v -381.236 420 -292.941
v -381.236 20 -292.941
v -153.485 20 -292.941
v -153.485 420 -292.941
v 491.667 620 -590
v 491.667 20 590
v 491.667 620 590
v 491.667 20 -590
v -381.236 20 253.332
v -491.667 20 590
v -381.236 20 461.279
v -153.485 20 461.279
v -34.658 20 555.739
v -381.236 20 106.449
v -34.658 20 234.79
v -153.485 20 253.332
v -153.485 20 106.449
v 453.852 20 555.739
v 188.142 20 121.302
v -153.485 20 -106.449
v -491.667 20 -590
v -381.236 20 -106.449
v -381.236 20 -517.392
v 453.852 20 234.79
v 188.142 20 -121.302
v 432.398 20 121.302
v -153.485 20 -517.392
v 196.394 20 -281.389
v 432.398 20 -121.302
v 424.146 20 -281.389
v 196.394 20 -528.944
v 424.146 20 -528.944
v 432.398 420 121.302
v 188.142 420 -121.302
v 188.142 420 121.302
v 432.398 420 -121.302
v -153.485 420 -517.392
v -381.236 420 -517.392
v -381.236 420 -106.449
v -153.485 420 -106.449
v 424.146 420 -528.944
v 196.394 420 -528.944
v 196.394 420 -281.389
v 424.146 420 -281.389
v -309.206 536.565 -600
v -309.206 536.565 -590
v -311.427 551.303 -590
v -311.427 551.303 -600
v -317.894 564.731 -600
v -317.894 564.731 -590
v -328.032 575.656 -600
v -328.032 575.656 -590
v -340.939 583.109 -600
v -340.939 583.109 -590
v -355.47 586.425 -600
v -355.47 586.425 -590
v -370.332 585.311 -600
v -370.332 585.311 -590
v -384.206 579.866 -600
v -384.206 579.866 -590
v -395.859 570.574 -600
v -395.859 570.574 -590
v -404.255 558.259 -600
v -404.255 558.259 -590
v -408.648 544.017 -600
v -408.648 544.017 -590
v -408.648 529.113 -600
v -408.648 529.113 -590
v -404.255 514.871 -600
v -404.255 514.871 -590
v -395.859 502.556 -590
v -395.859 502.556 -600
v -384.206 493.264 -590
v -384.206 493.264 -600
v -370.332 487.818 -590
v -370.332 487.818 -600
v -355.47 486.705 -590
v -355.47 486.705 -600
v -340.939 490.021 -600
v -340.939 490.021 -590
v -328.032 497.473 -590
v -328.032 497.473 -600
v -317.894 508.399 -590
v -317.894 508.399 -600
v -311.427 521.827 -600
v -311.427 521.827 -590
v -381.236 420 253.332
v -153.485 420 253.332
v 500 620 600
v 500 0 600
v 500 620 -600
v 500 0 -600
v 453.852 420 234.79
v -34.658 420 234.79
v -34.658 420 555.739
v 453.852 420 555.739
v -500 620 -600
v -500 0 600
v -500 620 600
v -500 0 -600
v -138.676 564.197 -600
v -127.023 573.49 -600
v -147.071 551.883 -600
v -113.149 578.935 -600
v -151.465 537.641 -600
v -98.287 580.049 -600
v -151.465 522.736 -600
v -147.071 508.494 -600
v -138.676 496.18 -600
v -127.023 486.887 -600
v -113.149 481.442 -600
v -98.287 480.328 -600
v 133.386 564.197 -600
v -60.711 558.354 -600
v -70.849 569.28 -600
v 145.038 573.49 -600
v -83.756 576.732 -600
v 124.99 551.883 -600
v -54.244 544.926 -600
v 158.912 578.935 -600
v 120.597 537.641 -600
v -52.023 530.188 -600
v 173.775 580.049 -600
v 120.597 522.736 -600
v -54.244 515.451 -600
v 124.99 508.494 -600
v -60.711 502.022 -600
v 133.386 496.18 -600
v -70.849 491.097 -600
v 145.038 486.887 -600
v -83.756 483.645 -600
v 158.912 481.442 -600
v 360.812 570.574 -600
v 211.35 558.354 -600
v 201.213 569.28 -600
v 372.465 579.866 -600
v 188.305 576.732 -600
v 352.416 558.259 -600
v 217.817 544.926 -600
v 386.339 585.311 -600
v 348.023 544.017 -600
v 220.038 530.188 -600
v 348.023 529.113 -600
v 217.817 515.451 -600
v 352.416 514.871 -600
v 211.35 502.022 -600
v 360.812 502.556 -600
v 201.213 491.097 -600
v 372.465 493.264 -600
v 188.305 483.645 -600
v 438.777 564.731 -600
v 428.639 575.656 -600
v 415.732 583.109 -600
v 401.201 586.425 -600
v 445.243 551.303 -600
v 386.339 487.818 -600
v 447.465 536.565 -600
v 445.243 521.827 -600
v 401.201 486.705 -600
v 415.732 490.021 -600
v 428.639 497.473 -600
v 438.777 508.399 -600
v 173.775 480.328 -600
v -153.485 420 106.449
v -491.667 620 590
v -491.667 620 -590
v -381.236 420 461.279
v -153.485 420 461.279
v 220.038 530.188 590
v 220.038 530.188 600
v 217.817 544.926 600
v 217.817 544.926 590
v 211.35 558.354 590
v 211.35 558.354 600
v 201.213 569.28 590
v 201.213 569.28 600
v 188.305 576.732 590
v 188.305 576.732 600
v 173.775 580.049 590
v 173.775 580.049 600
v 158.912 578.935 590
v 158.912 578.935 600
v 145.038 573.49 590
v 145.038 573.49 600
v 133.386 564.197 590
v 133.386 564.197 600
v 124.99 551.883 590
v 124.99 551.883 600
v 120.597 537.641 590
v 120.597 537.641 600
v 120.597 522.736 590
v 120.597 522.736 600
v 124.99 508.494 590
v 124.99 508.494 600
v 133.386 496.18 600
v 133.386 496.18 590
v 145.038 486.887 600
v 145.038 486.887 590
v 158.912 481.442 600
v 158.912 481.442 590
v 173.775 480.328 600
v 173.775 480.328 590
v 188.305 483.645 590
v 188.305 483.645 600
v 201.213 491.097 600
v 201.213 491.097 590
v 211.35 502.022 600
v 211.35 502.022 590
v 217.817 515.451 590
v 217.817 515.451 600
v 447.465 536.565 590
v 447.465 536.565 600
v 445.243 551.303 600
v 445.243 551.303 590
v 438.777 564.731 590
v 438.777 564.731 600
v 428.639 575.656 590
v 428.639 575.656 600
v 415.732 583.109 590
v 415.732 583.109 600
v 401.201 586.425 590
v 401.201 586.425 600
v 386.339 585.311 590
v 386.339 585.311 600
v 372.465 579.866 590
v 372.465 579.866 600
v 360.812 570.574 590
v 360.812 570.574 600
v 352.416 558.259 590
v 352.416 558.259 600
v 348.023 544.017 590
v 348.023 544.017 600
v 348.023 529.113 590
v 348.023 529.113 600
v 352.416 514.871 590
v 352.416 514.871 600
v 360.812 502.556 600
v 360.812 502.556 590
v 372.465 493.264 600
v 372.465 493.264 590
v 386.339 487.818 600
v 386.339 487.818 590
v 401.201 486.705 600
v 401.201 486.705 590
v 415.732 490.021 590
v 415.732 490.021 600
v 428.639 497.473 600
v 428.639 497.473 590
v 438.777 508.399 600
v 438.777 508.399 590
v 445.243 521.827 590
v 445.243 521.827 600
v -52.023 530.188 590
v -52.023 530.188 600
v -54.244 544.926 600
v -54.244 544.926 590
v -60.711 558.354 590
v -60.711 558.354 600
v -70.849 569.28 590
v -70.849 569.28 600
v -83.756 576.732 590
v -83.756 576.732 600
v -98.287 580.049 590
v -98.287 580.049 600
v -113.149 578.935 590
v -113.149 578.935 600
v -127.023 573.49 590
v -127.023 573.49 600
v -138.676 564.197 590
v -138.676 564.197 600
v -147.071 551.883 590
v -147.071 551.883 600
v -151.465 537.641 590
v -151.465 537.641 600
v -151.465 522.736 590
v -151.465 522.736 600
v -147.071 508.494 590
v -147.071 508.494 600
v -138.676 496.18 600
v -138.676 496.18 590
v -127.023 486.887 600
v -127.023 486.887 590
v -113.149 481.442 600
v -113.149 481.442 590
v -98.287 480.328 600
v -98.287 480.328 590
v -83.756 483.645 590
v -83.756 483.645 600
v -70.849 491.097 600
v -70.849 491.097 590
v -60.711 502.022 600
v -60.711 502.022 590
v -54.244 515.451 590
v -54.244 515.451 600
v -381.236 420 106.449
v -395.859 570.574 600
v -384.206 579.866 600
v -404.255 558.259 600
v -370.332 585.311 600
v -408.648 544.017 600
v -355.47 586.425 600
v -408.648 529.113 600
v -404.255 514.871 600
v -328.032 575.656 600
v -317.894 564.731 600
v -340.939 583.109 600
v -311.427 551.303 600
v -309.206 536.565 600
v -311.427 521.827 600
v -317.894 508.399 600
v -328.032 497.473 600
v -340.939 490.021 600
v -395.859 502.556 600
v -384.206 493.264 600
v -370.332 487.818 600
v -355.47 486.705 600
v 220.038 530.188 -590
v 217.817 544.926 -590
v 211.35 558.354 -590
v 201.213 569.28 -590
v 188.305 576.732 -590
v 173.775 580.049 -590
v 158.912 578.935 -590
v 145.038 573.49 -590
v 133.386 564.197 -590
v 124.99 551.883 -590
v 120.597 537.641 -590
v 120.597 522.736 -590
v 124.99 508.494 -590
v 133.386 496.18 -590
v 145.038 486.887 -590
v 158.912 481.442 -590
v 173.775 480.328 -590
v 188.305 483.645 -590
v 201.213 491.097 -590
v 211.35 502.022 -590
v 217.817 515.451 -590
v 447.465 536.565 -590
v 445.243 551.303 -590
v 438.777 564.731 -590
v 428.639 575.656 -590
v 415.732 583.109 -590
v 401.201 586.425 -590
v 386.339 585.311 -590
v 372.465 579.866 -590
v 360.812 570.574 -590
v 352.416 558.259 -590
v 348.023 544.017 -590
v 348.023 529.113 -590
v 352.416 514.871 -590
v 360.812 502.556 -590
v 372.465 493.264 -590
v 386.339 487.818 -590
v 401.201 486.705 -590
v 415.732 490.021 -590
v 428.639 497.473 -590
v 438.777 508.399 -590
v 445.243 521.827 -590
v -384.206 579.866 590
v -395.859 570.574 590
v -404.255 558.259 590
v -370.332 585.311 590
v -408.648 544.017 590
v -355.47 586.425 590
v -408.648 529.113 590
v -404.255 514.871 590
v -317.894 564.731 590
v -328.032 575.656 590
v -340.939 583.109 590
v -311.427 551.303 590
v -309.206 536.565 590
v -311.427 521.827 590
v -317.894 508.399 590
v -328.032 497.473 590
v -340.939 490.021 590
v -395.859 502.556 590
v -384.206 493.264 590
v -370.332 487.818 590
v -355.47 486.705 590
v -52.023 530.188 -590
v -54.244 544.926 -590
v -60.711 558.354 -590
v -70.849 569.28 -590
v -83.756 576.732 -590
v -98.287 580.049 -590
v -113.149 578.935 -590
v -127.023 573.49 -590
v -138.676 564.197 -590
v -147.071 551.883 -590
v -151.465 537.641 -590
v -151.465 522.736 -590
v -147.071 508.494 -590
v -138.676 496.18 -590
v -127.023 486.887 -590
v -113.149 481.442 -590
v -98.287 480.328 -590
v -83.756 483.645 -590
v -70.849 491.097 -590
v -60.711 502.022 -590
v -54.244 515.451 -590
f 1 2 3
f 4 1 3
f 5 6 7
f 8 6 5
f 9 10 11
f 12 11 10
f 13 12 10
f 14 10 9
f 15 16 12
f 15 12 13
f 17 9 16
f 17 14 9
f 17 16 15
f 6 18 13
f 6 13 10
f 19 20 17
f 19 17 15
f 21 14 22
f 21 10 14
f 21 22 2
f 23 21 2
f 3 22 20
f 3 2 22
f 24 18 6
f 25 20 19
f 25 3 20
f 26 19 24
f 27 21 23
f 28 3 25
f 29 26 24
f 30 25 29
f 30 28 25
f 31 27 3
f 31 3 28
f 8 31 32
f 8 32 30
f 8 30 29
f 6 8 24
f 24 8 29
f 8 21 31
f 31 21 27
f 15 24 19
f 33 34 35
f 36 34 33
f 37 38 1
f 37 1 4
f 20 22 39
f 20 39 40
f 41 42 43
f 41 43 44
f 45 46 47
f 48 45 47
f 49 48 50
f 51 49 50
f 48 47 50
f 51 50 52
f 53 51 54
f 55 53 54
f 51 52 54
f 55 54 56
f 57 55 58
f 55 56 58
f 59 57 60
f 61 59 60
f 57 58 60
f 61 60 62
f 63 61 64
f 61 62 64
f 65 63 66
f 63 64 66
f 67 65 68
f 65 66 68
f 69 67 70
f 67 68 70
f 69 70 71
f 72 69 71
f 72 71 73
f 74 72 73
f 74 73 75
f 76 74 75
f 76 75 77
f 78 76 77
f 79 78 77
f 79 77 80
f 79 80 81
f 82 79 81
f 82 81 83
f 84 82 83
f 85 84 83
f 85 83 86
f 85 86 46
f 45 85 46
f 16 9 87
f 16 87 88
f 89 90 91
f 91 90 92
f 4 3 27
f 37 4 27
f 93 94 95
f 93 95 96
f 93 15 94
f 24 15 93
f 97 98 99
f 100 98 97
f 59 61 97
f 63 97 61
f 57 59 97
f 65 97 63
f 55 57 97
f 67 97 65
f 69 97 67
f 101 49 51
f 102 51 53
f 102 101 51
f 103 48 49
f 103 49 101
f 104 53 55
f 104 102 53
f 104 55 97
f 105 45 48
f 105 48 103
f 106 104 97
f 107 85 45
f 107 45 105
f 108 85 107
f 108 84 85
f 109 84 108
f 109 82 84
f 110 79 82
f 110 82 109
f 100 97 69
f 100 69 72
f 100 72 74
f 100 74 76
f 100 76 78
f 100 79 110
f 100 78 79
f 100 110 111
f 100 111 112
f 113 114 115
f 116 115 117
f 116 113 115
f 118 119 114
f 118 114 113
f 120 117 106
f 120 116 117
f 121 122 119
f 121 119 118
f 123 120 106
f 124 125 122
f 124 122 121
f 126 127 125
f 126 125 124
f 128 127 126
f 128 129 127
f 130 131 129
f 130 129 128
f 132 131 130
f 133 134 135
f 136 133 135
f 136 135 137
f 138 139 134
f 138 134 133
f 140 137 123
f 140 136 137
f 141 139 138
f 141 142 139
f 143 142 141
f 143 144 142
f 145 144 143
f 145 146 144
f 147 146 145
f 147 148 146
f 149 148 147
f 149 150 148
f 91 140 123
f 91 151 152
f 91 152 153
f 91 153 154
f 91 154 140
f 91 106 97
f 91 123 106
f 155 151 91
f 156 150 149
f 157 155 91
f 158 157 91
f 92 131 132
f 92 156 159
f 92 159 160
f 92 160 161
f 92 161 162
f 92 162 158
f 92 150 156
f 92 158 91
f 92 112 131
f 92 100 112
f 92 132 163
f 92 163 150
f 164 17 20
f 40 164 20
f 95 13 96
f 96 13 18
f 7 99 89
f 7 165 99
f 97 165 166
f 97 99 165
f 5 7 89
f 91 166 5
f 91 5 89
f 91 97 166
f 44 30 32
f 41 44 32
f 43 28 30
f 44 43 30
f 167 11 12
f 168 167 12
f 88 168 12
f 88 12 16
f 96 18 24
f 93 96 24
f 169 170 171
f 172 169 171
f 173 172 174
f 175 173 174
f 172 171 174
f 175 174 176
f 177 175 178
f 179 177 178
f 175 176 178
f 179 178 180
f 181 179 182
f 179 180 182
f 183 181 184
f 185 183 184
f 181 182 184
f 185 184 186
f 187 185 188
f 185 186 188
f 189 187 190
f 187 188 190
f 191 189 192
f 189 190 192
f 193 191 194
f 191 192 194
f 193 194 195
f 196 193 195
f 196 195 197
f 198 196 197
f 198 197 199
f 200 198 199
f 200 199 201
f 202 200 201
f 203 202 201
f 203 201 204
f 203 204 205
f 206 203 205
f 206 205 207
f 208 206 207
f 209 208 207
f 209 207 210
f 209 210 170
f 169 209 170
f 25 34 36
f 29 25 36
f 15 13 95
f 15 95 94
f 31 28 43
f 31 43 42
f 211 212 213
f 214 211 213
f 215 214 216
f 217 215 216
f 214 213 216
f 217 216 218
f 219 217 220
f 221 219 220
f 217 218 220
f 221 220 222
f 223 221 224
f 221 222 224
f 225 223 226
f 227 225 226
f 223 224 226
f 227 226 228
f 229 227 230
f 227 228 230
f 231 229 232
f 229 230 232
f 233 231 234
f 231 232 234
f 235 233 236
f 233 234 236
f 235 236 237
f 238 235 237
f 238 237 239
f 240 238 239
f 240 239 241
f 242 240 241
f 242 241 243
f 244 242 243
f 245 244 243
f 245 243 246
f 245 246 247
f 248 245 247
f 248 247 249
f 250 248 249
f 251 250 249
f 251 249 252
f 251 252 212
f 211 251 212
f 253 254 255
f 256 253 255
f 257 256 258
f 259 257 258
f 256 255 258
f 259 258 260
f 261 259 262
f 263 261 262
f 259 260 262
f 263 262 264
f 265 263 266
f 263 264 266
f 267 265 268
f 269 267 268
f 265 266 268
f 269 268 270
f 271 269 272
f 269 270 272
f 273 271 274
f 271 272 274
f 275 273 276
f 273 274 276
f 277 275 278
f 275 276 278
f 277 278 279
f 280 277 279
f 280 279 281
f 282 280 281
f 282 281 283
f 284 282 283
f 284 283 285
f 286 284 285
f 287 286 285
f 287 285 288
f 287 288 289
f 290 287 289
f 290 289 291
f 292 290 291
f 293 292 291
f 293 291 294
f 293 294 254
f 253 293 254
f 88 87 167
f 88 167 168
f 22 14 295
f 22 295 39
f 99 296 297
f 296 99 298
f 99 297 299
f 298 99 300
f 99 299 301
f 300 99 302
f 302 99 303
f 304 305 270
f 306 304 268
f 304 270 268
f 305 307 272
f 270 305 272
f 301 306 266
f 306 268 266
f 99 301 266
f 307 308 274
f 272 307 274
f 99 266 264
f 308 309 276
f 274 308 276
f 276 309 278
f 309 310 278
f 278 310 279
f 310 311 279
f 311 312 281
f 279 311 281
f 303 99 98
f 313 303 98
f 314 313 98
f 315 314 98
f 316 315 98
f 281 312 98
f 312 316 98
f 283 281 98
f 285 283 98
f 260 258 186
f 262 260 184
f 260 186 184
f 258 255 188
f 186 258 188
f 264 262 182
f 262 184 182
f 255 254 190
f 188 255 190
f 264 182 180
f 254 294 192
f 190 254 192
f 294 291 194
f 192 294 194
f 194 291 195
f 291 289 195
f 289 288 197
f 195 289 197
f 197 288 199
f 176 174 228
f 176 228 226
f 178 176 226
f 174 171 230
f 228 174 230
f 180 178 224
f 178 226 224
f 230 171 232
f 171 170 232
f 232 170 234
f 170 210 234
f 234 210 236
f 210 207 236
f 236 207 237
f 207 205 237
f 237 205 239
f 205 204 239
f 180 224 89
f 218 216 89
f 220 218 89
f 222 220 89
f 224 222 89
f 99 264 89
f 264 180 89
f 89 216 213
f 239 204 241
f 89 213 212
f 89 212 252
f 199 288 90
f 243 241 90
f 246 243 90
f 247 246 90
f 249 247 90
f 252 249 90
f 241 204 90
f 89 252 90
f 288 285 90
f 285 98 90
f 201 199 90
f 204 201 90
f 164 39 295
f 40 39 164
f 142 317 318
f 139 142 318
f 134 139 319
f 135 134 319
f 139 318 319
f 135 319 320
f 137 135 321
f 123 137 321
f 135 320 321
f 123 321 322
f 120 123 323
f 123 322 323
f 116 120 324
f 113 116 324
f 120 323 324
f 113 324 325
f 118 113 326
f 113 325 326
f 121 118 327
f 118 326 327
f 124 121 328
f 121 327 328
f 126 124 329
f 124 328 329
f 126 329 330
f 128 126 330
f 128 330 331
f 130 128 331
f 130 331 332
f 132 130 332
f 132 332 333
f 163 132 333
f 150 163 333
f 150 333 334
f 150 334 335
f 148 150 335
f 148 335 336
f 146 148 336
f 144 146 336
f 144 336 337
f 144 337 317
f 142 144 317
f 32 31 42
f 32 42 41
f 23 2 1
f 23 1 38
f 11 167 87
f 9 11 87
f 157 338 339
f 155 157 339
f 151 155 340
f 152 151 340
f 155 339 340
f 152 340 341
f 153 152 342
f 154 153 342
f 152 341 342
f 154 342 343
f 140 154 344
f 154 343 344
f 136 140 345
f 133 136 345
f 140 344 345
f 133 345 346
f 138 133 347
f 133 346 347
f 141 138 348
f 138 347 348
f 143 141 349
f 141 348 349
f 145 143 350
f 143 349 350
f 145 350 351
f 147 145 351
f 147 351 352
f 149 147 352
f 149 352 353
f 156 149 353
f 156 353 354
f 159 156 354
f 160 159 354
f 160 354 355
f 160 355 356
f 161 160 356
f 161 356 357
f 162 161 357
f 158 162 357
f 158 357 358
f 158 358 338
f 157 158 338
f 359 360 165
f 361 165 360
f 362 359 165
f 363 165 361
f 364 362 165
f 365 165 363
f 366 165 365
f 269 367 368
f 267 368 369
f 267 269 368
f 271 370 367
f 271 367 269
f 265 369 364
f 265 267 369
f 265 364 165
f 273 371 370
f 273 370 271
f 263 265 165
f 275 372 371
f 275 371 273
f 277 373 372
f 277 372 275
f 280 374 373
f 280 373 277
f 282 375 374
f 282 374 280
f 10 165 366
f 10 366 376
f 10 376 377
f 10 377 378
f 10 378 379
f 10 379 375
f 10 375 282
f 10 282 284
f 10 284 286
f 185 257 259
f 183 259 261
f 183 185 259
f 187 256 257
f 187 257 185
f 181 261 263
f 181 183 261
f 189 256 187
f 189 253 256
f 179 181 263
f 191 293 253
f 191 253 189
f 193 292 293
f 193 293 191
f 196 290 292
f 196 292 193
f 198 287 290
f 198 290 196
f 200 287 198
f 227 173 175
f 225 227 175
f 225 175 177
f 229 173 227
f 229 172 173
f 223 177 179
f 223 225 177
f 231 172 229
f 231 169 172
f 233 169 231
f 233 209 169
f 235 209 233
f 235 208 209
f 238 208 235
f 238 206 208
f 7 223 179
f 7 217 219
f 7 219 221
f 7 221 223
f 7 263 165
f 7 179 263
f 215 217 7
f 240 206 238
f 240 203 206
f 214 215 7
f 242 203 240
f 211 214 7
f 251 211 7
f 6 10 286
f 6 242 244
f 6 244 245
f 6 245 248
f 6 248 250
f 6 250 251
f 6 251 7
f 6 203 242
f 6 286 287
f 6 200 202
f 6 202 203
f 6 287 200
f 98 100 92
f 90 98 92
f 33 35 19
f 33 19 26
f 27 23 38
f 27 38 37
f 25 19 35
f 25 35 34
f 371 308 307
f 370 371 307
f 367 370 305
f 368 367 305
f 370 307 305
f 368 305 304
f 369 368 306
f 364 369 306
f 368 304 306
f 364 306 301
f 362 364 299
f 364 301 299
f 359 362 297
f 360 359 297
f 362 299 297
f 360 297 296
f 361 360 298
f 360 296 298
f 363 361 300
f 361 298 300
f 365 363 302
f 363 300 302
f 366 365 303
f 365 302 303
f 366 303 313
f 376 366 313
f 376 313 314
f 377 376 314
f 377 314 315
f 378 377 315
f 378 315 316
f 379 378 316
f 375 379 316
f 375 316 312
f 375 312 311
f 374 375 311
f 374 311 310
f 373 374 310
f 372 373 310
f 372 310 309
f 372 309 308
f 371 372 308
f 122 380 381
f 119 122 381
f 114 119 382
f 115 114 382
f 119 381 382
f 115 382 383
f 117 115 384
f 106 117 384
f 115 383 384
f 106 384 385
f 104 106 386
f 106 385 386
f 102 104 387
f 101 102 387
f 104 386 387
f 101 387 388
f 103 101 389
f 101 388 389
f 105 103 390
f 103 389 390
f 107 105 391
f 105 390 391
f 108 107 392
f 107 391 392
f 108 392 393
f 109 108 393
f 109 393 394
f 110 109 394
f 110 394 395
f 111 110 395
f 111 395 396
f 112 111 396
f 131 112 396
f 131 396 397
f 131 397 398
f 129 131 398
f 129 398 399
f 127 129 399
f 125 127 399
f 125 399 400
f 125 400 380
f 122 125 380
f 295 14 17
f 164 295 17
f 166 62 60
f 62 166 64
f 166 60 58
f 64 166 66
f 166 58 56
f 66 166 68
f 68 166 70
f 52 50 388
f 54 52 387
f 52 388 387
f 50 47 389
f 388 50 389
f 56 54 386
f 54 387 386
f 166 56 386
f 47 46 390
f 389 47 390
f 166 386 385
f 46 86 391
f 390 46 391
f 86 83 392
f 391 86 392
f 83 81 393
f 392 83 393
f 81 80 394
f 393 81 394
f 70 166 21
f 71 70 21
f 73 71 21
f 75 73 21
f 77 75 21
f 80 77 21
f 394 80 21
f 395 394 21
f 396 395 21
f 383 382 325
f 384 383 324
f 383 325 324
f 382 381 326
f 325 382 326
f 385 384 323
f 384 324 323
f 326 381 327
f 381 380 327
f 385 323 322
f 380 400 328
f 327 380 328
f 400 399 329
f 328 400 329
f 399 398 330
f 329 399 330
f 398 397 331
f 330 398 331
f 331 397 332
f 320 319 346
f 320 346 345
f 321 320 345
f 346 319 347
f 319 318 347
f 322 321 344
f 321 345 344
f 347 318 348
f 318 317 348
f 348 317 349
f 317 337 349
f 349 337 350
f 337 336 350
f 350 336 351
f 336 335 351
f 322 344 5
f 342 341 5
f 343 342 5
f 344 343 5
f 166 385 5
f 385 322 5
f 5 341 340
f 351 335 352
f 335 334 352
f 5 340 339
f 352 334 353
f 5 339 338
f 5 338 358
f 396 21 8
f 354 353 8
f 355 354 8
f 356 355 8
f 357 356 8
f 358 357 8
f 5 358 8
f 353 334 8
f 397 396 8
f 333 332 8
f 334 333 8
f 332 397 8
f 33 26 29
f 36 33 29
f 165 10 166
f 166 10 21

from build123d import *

# Parameters (mm, degrees)
SKETCH1_W           = 1000
SKETCH1_H           = 1200
BOSS_EXTRUDE1_DEPTH = 20
SKETCH2_W           = 1000
SKETCH2_H           = 1200
SKETCH2_W_2         = 983.333333334
SKETCH2_H_2         = 1180
BOSS_EXTRUDE2_DEPTH = 600
SKETCH3_W           = 227.751399754
SKETCH3_H           = 224.45065483
SKETCH3_H_2         = 247.555869298
SKETCH3_H_3         = 212.898047596
SKETCH3_W_2         = 244.255124374
SKETCH3_H_4         = 242.604751912
SKETCH3_H_5         = 207.946930211
SKETCH3_W_3         = 488.510248749
SKETCH3_H_6         = 320.94890349
BOSS_EXTRUDE3_DEPTH = 400
SKETCH13_R          = 50
CUT_EXTRUDE1_DEPTH  = 1441.277750991


with BuildPart() as part:
    # Sketch1 → Boss-Extrude1 (new body)
    with BuildSketch(Plane(origin=(0, 0, 0), x_dir=(1, 0, 0), z_dir=(0, 1, 0))):
        Rectangle(SKETCH1_W, SKETCH1_H)
    extrude(amount=BOSS_EXTRUDE1_DEPTH)

    # Sketch2 → Boss-Extrude2 (add)
    with BuildSketch(Plane(origin=(0, 20, 0), x_dir=(1, 0, 0), z_dir=(0, 1, 0))):
        Rectangle(SKETCH2_W, SKETCH2_H)
        Rectangle(SKETCH2_W_2, SKETCH2_H_2, mode=Mode.SUBTRACT)
    extrude(amount=BOSS_EXTRUDE2_DEPTH)

    # Sketch3 → Boss-Extrude3 (add)
    with BuildSketch(Plane(origin=(0, 20, 0), x_dir=(1, 0, 0), z_dir=(0, 1, 0))):
        with Locations((-267.360338842, 405.166439418)):
            Rectangle(SKETCH3_W, SKETCH3_H)
        with Locations((310.270022854, 405.166439418)):
            Rectangle(SKETCH3_W, SKETCH3_H_2)
        with Locations((-267.360338842, 0)):
            Rectangle(SKETCH3_W, SKETCH3_H_3)
        with Locations((310.270022854, 0)):
            Rectangle(SKETCH3_W_2, SKETCH3_H_4)
        with Locations((-267.360338842, -357.305638021)):
            Rectangle(SKETCH3_W, SKETCH3_H_5)
        with Locations((209.597302673, -395.264204646)):
            Rectangle(SKETCH3_W_3, SKETCH3_H_6)
    extrude(amount=BOSS_EXTRUDE3_DEPTH)

    # Sketch13 → Cut-Extrude1 (cut, through all)
    with BuildSketch(Plane.XY.offset(600)):
        with Locations((-359.206066916, 536.564881977)):
            Circle(SKETCH13_R)
        with Locations((-102.023024923, 530.188442919)):
            Circle(SKETCH13_R)
        with Locations((170.038374872, 530.188442919)):
            Circle(SKETCH13_R)
        with Locations((397.464701262, 536.564881977)):
            Circle(SKETCH13_R)
    extrude(amount=-CUT_EXTRUDE1_DEPTH, mode=Mode.SUBTRACT)


solid = part.part
